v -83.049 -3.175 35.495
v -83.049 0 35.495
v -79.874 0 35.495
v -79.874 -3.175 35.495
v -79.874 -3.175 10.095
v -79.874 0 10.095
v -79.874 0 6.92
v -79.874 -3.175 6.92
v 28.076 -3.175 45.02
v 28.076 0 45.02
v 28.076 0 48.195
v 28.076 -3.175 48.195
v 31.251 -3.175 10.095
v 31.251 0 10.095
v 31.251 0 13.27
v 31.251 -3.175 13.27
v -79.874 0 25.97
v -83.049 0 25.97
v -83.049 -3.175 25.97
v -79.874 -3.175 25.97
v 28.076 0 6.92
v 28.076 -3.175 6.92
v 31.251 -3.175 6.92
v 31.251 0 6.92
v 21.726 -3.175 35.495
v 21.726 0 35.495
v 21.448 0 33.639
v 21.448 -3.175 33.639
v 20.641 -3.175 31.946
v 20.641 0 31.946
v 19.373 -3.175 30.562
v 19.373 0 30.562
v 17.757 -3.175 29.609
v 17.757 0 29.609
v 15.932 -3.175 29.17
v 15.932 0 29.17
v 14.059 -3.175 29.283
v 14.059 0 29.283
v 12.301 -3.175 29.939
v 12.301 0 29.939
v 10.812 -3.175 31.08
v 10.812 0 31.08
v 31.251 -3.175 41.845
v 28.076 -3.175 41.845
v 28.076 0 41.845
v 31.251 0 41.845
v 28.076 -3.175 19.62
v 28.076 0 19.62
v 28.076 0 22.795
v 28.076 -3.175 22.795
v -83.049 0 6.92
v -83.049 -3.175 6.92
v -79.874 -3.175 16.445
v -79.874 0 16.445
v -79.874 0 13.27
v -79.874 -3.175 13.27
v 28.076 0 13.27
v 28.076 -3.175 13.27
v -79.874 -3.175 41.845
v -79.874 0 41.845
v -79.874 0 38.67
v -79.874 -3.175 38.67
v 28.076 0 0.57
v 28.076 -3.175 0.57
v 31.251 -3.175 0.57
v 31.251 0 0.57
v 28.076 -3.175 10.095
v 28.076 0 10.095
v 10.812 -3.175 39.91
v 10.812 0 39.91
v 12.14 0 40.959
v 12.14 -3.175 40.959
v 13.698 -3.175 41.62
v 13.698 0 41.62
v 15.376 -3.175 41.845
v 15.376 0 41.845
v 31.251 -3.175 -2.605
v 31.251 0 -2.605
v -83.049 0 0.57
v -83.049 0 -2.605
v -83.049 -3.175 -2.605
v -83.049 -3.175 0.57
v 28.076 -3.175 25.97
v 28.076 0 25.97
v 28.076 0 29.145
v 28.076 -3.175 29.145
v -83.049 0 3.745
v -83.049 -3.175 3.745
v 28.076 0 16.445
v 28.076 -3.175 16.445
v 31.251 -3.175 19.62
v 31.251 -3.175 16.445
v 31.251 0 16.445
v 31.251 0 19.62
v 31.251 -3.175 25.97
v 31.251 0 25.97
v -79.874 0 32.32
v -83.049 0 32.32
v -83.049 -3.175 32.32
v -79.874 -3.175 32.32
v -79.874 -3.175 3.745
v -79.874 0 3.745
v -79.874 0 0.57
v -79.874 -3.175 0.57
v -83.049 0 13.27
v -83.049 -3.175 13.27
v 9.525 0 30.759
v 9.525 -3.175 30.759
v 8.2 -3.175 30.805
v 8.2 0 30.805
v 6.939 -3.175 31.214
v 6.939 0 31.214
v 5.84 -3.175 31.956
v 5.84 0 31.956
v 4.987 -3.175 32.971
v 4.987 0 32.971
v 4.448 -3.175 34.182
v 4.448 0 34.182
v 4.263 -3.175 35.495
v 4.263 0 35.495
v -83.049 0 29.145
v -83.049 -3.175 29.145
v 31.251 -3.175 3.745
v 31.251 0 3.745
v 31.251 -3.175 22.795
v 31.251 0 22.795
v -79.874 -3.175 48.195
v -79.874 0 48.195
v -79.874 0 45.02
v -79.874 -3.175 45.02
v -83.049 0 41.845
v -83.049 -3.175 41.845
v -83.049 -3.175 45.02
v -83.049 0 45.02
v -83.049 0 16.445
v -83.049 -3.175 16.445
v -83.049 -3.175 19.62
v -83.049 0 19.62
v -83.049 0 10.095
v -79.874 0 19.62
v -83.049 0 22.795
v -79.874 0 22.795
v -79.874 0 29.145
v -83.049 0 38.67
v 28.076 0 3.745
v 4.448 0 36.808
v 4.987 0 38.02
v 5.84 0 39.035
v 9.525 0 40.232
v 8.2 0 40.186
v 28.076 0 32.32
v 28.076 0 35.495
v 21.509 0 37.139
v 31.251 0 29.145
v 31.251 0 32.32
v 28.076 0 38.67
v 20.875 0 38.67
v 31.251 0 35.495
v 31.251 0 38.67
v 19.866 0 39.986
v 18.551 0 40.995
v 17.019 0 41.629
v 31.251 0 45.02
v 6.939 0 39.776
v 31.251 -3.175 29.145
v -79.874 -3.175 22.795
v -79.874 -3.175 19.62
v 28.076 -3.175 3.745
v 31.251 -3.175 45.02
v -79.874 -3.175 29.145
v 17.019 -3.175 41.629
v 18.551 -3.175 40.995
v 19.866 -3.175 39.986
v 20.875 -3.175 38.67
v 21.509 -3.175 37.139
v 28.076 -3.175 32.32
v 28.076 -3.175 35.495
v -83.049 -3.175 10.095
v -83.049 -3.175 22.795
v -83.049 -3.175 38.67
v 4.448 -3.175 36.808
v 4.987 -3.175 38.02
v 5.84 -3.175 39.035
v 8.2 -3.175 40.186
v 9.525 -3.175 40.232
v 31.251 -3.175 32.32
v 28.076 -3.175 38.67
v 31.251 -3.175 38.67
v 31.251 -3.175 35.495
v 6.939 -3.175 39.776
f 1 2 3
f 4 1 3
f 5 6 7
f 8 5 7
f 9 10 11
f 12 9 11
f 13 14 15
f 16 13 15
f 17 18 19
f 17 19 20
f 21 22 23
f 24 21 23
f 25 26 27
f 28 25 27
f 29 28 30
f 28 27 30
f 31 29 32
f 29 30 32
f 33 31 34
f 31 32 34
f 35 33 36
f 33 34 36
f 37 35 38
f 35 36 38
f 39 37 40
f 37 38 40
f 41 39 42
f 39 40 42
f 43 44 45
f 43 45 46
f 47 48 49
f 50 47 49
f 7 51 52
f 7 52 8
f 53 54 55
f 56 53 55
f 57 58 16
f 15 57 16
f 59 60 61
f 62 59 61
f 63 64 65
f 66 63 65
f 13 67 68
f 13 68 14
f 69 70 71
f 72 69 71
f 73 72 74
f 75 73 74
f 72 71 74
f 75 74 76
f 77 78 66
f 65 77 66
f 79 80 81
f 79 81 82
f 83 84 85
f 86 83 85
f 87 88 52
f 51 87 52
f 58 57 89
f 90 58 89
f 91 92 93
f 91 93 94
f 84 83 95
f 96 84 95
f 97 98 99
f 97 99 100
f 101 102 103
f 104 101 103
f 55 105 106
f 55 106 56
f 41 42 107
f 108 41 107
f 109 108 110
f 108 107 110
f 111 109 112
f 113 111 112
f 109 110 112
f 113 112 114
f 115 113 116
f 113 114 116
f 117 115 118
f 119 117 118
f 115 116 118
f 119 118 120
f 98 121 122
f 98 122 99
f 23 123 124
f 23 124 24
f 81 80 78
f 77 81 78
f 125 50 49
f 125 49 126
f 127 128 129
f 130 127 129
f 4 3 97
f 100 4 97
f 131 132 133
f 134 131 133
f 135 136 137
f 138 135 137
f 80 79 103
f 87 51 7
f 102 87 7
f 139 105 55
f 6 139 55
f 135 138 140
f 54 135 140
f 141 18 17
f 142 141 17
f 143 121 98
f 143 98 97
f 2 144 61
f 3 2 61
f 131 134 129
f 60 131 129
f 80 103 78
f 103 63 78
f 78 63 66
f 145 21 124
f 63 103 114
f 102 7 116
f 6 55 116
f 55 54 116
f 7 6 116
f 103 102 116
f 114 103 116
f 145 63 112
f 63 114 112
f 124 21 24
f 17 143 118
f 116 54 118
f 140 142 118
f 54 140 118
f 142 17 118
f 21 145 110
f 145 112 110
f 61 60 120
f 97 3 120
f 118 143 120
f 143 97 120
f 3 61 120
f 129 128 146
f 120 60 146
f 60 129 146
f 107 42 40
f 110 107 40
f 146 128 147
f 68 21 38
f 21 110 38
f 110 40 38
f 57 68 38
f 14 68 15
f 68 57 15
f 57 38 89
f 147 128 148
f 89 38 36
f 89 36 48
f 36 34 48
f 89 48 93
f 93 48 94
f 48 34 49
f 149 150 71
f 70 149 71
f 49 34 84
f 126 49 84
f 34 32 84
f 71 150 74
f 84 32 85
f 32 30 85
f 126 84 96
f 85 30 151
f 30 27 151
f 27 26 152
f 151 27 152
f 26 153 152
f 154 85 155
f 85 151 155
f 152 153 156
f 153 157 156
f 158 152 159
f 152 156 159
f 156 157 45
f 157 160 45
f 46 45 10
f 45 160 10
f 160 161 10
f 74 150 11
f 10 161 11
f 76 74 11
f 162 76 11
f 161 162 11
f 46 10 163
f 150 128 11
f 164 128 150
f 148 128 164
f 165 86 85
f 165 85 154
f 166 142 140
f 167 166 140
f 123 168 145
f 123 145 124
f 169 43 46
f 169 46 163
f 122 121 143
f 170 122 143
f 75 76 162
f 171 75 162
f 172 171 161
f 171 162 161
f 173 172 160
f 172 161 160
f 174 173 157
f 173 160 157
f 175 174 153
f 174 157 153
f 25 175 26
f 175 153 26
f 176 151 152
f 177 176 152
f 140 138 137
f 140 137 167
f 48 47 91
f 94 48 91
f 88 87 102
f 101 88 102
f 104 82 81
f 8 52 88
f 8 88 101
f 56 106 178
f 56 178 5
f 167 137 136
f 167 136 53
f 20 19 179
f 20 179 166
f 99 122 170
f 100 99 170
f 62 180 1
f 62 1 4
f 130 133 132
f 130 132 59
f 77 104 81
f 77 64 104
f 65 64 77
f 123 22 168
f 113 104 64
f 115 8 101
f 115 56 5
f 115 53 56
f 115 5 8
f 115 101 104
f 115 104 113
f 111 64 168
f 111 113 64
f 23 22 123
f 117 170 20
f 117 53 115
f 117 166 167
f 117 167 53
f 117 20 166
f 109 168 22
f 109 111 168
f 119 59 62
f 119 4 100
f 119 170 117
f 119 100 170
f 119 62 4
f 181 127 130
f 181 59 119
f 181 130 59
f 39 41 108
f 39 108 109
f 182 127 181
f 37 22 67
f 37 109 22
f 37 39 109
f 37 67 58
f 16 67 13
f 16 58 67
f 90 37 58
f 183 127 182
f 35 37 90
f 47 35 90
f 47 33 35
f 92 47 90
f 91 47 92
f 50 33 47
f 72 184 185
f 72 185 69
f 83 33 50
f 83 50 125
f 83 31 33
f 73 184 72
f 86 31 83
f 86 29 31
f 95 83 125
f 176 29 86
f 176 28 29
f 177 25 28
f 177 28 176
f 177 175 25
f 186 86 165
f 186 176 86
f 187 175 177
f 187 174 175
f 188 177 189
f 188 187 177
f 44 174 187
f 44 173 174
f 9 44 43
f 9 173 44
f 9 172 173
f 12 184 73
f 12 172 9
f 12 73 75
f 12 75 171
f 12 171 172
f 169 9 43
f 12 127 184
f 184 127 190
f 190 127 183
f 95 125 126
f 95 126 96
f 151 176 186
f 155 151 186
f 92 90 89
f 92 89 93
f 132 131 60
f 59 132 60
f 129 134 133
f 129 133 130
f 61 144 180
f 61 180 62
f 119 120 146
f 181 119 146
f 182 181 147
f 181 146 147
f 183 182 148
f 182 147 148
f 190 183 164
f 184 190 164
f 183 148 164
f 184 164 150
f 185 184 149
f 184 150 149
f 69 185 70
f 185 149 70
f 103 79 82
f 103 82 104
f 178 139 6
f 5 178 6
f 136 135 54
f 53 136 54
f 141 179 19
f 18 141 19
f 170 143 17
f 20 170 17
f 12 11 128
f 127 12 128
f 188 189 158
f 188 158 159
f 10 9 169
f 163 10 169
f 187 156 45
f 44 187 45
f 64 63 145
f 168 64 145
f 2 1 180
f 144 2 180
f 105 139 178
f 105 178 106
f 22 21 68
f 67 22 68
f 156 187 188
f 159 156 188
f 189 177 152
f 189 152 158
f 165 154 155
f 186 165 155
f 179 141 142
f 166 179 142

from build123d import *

# Parameters (mm, degrees)
F0_W     = 3.175
F0_H     = 3.175
F0_W_2   = 69.85
F0_H_2   = 12.7
F1_DEPTH = 3.175


with BuildPart() as f1:
    # F0 (on Front) → F1 (new body)
    with BuildSketch(Plane.XZ):
        Polygon((-67.174376142, 48.1953912664), (-79.874376142, 48.1953912664), (-79.874376142, 45.0203912664), (-79.874376142, 41.8453912664), (-79.874376142, 38.6703912664), (-79.874376142, 35.4953912664), (-67.174376142, 35.4953912664), align=None)
        with Locations((-81.461876142, 43.4328912664)):
            Rectangle(F0_W, F0_H)
        with Locations((-32.249376142, 41.8453912664)):
            Rectangle(F0_W_2, F0_H_2)
        with BuildLine():
            Line((15.375623858, 48.1953912664), (2.675623858, 48.1953912664))
            Line((2.675623858, 48.1953912664), (2.675623858, 35.4953912664))
            Line((2.675623858, 35.4953912664), (4.263123858, 35.4953912664))
            ThreePointArc((4.263123858, 35.4953912664), (6.3633054223, 39.4442476574), (10.811561358, 39.9103469283))
            ThreePointArc((10.811561358, 39.9103469283), (12.8969617645, 41.3416494053), (15.375623858, 41.8453912664))
            Line((15.375623858, 41.8453912664), (15.375623858, 48.1953912664))
        make_face()
        with BuildLine():
            Line((2.675623858, 35.4953912664), (-67.174376142, 35.4953912664))
            Line((-67.174376142, 35.4953912664), (-67.174376142, -2.6046087336))
            Line((-67.174376142, -2.6046087336), (28.075623858, -2.6046087336))
            Line((28.075623858, -2.6046087336), (28.075623858, 0.5703912664))
            Line((28.075623858, 0.5703912664), (28.075623858, 3.7453912664))
            Line((28.075623858, 3.7453912664), (28.075623858, 6.9203912664))
            Line((28.075623858, 6.9203912664), (28.075623858, 10.0953912664))
            Line((28.075623858, 10.0953912664), (28.075623858, 13.2703912664))
            Line((28.075623858, 13.2703912664), (28.075623858, 16.4453912664))
            Line((28.075623858, 16.4453912664), (28.075623858, 19.6203912664))
            Line((28.075623858, 19.6203912664), (28.075623858, 22.7953912664))
            Line((28.075623858, 22.7953912664), (28.075623858, 25.9703912664))
            Line((28.075623858, 25.9703912664), (28.075623858, 29.1453912664))
            Line((28.075623858, 29.1453912664), (28.075623858, 32.3203912664))
            Line((28.075623858, 32.3203912664), (28.075623858, 35.4953912664))
            Line((28.075623858, 35.4953912664), (21.725623858, 35.4953912664))
            ThreePointArc((21.725623858, 35.4953912664), (17.756873858, 29.6087837173), (10.811561358, 31.0804356046))
            ThreePointArc((10.811561358, 31.0804356046), (6.3633054223, 31.5465348754), (4.263123858, 35.4953912664))
            Line((4.263123858, 35.4953912664), (2.675623858, 35.4953912664))
        make_face()
        Polygon((-67.174376142, -2.6046087336), (-67.174376142, 35.4953912664), (-79.874376142, 35.4953912664), (-79.874376142, 32.3203912664), (-79.874376142, 29.1453912664), (-79.874376142, 25.9703912664), (-79.874376142, 22.7953912664), (-79.874376142, 19.6203912664), (-79.874376142, 16.4453912664), (-79.874376142, 13.2703912664), (-79.874376142, 10.0953912664), (-79.874376142, 6.9203912664), (-79.874376142, 3.7453912664), (-79.874376142, 0.5703912664), (-79.874376142, -2.6046087336), align=None)
        with Locations((-81.461876142, 37.0828912664)):
            Rectangle(F0_W, F0_H)
        with BuildLine():
            Line((28.075623858, 48.1953912664), (15.375623858, 48.1953912664))
            Line((15.375623858, 48.1953912664), (15.375623858, 41.8453912664))
            ThreePointArc((15.375623858, 41.8453912664), (19.8657519185, 39.985519327), (21.725623858, 35.4953912664))
            Line((21.725623858, 35.4953912664), (28.075623858, 35.4953912664))
            Line((28.075623858, 35.4953912664), (28.075623858, 38.6703912664))
            Line((28.075623858, 38.6703912664), (28.075623858, 41.8453912664))
            Line((28.075623858, 41.8453912664), (28.075623858, 45.0203912664))
            Line((28.075623858, 45.0203912664), (28.075623858, 48.1953912664))
        make_face()
        with Locations((-81.461876142, -1.0171087336)):
            Rectangle(F0_W, F0_H)
        with Locations((29.663123858, -1.0171087336)):
            Rectangle(F0_W, F0_H)
        with Locations((-81.461876142, 30.7328912664)):
            Rectangle(F0_W, F0_H)
        with Locations((29.663123858, 43.4328912664)):
            Rectangle(F0_W, F0_H)
        with Locations((29.663123858, 37.0828912664)):
            Rectangle(F0_W, F0_H)
        with Locations((-81.461876142, 5.3328912664)):
            Rectangle(F0_W, F0_H)
        with Locations((29.663123858, 5.3328912664)):
            Rectangle(F0_W, F0_H)
        with Locations((-81.461876142, 24.3828912664)):
            Rectangle(F0_W, F0_H)
        with Locations((29.663123858, 30.7328912664)):
            Rectangle(F0_W, F0_H)
        with Locations((-81.461876142, 11.6828912664)):
            Rectangle(F0_W, F0_H)
        with Locations((29.663123858, 11.6828912664)):
            Rectangle(F0_W, F0_H)
        with Locations((-81.461876142, 18.0328912664)):
            Rectangle(F0_W, F0_H)
        with Locations((29.663123858, 24.3828912664)):
            Rectangle(F0_W, F0_H)
        with Locations((29.663123858, 18.0328912664)):
            Rectangle(F0_W, F0_H)
    extrude(amount=F1_DEPTH)


solid = f1.part
